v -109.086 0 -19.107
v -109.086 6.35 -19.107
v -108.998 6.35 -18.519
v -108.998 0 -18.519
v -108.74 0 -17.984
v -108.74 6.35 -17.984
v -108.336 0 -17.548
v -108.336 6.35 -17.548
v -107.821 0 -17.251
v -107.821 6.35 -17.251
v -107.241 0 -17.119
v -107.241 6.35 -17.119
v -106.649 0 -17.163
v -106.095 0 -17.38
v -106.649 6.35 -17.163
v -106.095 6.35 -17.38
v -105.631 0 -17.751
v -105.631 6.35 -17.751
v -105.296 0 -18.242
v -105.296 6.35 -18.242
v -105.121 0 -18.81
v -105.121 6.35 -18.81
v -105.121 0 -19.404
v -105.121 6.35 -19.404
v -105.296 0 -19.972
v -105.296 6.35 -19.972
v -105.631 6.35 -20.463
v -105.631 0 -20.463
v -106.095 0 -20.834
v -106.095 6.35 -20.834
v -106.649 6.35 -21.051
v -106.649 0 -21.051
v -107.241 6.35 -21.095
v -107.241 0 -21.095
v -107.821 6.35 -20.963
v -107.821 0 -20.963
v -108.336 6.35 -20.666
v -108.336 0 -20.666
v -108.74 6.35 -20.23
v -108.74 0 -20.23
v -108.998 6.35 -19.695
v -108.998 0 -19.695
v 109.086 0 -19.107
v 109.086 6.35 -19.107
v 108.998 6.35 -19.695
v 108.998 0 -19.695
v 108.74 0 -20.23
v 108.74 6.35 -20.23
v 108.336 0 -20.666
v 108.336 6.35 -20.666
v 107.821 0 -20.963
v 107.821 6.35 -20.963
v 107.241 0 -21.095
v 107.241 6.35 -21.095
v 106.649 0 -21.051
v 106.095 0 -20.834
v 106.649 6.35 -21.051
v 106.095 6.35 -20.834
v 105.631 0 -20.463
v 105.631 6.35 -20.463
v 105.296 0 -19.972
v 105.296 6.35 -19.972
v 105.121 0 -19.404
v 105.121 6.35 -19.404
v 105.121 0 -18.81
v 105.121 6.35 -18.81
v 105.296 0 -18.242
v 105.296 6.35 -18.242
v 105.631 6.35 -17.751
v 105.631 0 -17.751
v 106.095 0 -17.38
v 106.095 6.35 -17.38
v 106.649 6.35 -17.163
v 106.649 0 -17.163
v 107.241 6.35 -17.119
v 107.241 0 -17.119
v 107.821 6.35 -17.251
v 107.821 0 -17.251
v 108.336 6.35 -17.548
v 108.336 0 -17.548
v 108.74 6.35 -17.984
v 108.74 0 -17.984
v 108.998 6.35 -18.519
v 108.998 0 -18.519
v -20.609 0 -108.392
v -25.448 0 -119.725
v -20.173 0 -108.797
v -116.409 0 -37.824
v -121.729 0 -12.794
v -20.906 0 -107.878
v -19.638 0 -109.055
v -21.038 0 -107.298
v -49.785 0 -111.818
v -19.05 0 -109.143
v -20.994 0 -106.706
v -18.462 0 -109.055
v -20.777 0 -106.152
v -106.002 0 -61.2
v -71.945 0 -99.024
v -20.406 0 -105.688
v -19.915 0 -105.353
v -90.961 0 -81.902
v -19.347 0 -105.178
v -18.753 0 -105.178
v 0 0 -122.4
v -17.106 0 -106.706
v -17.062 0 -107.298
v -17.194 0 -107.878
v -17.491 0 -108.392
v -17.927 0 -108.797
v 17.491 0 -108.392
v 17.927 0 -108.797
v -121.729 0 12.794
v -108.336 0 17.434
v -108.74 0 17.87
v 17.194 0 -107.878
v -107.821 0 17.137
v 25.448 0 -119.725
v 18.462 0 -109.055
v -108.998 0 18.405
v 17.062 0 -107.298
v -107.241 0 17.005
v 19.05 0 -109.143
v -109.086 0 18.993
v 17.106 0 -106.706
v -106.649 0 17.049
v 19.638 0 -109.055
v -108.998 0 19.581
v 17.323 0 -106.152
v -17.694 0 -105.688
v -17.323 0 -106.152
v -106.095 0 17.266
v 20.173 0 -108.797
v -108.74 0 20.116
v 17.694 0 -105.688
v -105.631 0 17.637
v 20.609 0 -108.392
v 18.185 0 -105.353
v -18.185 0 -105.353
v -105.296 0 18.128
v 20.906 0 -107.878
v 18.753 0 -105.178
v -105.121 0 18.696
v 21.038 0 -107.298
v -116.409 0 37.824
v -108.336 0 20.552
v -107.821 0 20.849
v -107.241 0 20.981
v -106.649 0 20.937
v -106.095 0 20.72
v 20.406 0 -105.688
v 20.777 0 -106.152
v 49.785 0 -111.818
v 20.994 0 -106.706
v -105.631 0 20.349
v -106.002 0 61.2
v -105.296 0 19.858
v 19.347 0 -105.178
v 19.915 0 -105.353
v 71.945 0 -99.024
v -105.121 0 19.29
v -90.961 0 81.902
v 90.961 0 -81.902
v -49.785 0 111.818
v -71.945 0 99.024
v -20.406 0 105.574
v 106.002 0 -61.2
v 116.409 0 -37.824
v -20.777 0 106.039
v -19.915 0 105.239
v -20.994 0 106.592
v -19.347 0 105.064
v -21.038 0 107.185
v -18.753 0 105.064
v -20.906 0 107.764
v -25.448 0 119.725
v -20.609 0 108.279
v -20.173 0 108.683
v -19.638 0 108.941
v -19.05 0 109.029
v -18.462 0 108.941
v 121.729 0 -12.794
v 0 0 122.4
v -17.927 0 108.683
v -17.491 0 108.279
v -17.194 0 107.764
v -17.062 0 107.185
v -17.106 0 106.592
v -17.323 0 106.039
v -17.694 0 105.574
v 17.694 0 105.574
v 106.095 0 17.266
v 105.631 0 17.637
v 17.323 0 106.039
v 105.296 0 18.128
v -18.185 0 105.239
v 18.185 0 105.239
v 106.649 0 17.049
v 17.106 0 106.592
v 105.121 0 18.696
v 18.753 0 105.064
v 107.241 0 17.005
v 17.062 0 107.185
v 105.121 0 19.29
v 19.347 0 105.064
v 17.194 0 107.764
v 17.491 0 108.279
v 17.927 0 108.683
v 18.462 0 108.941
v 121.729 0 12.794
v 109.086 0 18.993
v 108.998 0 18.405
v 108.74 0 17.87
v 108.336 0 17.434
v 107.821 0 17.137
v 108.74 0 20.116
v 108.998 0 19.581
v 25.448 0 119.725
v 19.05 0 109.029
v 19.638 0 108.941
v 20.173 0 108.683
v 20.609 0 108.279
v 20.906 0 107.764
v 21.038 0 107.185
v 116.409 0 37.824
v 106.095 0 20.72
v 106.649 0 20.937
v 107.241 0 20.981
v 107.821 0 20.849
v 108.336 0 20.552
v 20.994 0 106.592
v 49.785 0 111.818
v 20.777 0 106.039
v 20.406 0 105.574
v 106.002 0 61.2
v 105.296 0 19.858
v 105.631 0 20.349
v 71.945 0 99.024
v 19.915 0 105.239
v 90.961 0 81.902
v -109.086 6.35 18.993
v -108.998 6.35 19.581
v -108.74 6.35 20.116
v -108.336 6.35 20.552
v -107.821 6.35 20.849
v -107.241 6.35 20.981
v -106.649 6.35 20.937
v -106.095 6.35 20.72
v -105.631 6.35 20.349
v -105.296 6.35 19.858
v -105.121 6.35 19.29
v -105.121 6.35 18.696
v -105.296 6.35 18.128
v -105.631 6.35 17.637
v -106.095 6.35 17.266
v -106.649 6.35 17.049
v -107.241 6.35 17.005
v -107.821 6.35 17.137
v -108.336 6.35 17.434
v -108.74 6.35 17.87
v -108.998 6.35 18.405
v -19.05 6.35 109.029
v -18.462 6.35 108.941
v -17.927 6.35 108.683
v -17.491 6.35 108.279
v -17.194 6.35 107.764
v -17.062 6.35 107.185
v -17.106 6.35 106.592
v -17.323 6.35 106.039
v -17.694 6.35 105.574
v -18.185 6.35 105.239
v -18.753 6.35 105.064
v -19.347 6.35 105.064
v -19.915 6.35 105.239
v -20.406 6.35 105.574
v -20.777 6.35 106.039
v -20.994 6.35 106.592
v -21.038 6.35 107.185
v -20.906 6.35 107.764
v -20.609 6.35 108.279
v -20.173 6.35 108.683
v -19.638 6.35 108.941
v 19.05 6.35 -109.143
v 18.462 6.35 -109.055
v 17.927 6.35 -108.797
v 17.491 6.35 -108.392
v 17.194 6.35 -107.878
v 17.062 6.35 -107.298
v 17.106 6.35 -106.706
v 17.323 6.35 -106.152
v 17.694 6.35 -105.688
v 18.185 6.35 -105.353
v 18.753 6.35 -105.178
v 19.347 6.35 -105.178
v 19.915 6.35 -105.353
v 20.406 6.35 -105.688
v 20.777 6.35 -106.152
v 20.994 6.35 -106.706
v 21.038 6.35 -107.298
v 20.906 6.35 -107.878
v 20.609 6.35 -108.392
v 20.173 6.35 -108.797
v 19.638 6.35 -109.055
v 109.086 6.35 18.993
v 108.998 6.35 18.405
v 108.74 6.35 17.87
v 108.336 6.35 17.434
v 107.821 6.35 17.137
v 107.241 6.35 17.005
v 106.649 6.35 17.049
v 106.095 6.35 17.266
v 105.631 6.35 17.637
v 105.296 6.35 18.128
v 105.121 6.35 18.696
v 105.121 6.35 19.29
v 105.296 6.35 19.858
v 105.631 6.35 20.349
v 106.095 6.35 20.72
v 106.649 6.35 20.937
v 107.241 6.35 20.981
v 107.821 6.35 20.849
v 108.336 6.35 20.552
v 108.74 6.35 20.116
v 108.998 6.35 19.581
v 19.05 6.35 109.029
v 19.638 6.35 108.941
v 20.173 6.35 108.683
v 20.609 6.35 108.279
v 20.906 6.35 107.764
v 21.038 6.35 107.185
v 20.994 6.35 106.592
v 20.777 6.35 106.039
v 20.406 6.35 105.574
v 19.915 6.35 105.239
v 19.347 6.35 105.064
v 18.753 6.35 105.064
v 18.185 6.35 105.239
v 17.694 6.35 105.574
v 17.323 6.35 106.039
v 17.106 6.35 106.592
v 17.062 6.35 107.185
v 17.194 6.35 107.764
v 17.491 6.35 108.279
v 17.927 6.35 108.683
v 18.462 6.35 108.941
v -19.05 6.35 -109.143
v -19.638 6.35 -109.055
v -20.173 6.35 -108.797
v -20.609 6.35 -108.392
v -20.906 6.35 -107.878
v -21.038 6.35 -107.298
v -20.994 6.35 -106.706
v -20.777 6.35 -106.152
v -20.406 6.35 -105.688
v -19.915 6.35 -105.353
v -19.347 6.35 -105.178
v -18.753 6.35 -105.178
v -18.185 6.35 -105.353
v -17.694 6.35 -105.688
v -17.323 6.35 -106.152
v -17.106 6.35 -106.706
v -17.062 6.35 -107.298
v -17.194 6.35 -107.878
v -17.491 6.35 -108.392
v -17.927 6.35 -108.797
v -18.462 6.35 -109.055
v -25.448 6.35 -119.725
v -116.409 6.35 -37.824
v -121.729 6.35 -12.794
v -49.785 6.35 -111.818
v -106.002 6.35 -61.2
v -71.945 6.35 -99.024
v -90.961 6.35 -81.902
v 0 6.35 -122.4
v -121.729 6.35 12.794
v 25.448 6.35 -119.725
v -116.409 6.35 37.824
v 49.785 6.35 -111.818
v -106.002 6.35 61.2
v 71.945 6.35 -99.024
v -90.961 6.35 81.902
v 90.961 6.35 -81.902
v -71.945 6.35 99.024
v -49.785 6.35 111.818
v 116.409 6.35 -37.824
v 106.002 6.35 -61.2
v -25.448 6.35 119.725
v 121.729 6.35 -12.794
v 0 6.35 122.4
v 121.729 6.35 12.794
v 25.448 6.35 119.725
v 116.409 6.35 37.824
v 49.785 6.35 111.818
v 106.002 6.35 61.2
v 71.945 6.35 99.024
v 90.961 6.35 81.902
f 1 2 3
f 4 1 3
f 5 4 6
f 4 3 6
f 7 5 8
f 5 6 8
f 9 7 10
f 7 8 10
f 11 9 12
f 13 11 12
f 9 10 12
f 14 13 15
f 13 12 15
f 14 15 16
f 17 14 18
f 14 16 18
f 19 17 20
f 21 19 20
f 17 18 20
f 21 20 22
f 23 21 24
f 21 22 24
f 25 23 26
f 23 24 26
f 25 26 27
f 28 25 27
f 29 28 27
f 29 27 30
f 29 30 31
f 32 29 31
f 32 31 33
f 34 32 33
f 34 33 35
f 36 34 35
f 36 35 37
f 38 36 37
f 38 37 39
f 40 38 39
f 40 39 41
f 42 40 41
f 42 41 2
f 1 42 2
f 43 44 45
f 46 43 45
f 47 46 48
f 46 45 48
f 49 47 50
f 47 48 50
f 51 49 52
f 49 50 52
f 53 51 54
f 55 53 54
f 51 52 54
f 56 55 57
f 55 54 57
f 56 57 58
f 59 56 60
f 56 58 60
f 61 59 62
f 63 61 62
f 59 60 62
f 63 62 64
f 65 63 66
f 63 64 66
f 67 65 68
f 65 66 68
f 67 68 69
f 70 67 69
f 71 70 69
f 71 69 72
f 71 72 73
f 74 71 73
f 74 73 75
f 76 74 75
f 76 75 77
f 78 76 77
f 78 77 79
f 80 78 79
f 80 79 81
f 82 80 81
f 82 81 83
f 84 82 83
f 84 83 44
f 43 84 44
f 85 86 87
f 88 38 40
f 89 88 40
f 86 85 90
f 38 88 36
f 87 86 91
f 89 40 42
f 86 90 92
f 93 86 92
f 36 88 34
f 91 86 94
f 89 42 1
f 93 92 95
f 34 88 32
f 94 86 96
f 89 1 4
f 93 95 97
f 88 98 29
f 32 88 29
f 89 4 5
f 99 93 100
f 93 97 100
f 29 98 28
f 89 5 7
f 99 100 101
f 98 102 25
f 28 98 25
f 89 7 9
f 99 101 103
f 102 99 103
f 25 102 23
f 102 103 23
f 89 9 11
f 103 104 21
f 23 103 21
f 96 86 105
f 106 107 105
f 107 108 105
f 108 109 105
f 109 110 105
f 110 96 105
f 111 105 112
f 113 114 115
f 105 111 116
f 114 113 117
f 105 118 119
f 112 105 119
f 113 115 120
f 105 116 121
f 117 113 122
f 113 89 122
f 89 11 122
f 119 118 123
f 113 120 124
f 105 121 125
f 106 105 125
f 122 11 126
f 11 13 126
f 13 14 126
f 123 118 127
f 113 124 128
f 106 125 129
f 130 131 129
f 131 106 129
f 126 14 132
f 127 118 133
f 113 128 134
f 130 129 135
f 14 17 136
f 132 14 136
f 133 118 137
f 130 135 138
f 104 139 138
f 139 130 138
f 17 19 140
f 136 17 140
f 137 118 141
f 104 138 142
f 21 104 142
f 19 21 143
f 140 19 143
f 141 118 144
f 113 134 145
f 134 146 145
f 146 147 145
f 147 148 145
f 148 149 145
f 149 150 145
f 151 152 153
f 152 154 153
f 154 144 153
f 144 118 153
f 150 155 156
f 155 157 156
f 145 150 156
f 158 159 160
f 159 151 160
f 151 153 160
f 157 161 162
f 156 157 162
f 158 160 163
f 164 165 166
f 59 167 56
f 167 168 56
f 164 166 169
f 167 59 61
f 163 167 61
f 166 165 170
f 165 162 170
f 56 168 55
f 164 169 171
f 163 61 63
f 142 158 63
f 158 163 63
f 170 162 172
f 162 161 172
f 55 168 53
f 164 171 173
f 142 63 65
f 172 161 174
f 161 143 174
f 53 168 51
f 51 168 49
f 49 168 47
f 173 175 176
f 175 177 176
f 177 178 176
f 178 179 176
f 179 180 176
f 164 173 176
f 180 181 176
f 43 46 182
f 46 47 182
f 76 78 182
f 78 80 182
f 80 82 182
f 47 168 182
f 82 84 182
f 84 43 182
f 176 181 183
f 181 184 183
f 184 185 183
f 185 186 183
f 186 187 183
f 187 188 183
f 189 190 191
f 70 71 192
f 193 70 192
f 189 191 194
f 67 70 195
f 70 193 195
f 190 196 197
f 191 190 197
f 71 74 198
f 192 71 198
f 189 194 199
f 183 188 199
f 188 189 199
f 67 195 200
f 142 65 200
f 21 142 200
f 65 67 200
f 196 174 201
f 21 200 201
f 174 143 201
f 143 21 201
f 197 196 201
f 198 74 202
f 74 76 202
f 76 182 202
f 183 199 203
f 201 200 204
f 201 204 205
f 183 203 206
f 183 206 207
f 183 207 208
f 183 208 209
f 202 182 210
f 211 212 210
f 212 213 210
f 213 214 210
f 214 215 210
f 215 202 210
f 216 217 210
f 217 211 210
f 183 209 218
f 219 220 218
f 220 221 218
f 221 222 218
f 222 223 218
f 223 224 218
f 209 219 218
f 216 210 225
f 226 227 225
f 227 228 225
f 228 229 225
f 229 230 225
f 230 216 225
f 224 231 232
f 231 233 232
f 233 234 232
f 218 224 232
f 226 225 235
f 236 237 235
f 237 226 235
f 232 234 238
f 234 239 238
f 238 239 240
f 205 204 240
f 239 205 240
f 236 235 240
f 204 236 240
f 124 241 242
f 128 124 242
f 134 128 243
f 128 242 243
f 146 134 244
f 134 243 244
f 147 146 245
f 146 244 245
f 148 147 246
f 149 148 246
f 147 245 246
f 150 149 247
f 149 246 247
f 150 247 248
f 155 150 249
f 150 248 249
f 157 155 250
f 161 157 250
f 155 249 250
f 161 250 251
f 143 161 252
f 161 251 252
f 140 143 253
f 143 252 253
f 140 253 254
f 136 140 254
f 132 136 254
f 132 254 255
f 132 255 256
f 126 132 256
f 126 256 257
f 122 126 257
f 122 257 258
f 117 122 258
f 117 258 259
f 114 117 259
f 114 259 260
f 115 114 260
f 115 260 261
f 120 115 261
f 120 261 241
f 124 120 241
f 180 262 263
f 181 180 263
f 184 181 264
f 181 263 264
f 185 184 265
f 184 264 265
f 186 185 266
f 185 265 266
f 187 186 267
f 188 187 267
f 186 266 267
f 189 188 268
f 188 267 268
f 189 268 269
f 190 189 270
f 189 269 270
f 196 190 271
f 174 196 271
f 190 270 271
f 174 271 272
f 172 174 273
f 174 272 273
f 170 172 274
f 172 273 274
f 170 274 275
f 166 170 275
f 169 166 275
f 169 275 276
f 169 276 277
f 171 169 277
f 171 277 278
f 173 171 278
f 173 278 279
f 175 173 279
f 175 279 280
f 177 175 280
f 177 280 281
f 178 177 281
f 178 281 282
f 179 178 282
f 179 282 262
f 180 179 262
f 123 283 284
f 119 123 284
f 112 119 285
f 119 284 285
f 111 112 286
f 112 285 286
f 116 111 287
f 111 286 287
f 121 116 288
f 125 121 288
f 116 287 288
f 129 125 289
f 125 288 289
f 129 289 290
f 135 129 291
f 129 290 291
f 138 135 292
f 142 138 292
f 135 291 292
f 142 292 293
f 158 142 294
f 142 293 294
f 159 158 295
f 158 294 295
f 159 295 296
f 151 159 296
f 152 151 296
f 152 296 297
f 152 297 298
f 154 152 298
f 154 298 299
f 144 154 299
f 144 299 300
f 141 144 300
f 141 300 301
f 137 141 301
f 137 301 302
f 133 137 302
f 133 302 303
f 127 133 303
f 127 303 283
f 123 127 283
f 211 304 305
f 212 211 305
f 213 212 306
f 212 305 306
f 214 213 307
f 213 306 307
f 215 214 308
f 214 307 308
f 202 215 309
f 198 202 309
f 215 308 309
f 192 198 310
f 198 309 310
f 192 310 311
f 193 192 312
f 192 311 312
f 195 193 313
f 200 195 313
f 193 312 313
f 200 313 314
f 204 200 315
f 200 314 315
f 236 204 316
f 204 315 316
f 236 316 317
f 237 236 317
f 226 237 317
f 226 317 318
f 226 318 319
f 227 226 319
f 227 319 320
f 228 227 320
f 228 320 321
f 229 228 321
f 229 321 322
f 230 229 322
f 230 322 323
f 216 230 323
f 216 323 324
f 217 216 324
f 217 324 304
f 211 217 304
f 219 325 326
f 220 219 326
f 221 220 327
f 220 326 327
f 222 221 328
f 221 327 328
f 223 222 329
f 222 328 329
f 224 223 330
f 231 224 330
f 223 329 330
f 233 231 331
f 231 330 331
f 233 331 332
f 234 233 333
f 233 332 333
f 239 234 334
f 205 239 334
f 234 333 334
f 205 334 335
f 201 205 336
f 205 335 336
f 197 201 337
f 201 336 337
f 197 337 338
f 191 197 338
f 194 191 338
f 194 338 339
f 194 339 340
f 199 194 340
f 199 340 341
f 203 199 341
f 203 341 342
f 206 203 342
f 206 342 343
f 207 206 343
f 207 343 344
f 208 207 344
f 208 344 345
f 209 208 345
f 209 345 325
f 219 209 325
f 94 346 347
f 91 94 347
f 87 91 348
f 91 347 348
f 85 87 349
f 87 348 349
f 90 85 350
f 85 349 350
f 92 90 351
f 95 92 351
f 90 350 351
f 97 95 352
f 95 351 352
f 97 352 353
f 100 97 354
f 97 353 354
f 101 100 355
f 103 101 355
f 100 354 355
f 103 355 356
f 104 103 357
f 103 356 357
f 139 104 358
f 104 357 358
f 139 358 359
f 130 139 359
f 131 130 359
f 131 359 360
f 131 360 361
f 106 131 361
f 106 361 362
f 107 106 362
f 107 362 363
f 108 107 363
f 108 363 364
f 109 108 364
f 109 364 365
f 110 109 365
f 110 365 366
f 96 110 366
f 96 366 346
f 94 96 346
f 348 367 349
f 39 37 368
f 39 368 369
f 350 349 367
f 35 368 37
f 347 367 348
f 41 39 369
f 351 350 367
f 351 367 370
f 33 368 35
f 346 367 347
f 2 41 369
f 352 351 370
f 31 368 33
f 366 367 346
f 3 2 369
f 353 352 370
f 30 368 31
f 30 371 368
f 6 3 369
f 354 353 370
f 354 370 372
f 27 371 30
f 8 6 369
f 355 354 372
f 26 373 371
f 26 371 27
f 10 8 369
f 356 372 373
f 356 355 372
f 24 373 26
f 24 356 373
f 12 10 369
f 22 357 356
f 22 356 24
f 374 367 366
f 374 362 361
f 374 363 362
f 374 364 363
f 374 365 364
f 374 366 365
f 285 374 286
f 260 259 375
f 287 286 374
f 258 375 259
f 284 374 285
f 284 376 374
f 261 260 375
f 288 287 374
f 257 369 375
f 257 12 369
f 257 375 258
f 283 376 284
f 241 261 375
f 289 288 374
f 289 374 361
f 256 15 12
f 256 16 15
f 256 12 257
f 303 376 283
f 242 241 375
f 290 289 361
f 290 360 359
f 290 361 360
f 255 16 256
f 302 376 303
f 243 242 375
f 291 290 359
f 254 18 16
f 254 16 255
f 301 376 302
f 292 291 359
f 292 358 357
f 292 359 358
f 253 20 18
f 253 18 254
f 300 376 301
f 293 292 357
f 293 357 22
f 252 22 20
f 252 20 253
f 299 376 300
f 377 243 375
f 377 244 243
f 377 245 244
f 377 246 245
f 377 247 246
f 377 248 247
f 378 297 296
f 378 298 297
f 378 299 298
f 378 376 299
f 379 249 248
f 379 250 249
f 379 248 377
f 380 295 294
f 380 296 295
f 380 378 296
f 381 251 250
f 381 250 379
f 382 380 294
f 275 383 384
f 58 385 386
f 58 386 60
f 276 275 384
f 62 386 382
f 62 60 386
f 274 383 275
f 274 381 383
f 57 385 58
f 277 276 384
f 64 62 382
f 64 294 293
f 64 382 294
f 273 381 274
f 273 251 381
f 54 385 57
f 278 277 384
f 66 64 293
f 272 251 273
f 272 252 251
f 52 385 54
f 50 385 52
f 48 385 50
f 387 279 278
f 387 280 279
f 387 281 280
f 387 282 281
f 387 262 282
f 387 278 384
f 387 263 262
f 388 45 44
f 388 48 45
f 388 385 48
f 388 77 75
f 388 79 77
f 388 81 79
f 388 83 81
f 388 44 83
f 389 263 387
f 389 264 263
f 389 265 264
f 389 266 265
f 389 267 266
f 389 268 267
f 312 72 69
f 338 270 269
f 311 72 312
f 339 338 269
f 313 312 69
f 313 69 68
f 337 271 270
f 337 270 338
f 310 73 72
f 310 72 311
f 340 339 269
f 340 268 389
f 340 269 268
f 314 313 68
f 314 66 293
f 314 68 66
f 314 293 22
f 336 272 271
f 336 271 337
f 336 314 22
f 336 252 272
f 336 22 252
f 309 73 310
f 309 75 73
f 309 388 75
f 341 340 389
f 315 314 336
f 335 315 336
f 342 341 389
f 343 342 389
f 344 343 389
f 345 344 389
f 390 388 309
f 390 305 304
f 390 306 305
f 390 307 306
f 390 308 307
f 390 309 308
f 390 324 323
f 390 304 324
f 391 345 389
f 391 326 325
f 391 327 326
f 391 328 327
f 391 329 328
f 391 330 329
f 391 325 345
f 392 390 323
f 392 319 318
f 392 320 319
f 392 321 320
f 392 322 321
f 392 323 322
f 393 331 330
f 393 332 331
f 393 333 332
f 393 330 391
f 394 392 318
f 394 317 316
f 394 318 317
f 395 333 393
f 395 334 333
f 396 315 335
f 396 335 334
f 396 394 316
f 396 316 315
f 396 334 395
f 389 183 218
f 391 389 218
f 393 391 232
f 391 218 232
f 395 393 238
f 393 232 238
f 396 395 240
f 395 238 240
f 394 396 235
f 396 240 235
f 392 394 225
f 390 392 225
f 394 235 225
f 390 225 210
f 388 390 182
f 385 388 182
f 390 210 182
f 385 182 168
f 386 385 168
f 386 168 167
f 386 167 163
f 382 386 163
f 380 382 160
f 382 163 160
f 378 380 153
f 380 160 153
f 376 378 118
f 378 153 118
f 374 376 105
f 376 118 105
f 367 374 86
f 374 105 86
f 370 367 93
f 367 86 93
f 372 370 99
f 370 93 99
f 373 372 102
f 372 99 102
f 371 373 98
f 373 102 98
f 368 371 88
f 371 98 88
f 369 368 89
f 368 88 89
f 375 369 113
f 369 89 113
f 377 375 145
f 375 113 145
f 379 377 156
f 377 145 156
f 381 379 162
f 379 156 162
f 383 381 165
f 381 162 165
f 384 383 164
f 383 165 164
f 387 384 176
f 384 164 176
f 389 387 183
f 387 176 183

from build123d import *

# Parameters (mm, degrees)
SKETCH1_R           = 122.4
BOSS_EXTRUDE1_DEPTH = 6.35
SKETCH2_R           = 1.9939
CUT_EXTRUDE1_DEPTH  = 174.216172744
CIRPATTERN1_COUNT   = 4


with BuildPart() as part:
    # Sketch1 → Boss-Extrude1 (new body)
    with BuildSketch(Plane(origin=(0, 0, 0), x_dir=(1, 0, 0), z_dir=(0, 1, 0))):
        with Locations(Location((0, 0, 0), (0, 0, 270))):
            Circle(SKETCH1_R)
    extrude(amount=BOSS_EXTRUDE1_DEPTH)

    # Sketch2 → Cut-Extrude1 (cut, through all)
    with BuildSketch(Plane(origin=(0, 6.35, 0), x_dir=(1, 0, 0), z_dir=(0, 1, 0))):
        with Locations(Location((-19.05, -107.035541925, 0), (0, 0, 270))):
            Circle(SKETCH2_R)
        with Locations(Location((19.05, -107.035541925, 0), (0, 0, 270))):
            Circle(SKETCH2_R)
    cut_extrude1 = extrude(amount=-CUT_EXTRUDE1_DEPTH, mode=Mode.SUBTRACT)

    # CirPattern1: Cut-Extrude1 ×4 about axis
    cirpattern1_axis = Axis((0, 0, -0.056837174), (0, 1, 0))
    for i in range(1, CIRPATTERN1_COUNT):
        add(cut_extrude1.rotate(cirpattern1_axis, i * 360 / CIRPATTERN1_COUNT), mode=Mode.SUBTRACT)


solid = part.part
